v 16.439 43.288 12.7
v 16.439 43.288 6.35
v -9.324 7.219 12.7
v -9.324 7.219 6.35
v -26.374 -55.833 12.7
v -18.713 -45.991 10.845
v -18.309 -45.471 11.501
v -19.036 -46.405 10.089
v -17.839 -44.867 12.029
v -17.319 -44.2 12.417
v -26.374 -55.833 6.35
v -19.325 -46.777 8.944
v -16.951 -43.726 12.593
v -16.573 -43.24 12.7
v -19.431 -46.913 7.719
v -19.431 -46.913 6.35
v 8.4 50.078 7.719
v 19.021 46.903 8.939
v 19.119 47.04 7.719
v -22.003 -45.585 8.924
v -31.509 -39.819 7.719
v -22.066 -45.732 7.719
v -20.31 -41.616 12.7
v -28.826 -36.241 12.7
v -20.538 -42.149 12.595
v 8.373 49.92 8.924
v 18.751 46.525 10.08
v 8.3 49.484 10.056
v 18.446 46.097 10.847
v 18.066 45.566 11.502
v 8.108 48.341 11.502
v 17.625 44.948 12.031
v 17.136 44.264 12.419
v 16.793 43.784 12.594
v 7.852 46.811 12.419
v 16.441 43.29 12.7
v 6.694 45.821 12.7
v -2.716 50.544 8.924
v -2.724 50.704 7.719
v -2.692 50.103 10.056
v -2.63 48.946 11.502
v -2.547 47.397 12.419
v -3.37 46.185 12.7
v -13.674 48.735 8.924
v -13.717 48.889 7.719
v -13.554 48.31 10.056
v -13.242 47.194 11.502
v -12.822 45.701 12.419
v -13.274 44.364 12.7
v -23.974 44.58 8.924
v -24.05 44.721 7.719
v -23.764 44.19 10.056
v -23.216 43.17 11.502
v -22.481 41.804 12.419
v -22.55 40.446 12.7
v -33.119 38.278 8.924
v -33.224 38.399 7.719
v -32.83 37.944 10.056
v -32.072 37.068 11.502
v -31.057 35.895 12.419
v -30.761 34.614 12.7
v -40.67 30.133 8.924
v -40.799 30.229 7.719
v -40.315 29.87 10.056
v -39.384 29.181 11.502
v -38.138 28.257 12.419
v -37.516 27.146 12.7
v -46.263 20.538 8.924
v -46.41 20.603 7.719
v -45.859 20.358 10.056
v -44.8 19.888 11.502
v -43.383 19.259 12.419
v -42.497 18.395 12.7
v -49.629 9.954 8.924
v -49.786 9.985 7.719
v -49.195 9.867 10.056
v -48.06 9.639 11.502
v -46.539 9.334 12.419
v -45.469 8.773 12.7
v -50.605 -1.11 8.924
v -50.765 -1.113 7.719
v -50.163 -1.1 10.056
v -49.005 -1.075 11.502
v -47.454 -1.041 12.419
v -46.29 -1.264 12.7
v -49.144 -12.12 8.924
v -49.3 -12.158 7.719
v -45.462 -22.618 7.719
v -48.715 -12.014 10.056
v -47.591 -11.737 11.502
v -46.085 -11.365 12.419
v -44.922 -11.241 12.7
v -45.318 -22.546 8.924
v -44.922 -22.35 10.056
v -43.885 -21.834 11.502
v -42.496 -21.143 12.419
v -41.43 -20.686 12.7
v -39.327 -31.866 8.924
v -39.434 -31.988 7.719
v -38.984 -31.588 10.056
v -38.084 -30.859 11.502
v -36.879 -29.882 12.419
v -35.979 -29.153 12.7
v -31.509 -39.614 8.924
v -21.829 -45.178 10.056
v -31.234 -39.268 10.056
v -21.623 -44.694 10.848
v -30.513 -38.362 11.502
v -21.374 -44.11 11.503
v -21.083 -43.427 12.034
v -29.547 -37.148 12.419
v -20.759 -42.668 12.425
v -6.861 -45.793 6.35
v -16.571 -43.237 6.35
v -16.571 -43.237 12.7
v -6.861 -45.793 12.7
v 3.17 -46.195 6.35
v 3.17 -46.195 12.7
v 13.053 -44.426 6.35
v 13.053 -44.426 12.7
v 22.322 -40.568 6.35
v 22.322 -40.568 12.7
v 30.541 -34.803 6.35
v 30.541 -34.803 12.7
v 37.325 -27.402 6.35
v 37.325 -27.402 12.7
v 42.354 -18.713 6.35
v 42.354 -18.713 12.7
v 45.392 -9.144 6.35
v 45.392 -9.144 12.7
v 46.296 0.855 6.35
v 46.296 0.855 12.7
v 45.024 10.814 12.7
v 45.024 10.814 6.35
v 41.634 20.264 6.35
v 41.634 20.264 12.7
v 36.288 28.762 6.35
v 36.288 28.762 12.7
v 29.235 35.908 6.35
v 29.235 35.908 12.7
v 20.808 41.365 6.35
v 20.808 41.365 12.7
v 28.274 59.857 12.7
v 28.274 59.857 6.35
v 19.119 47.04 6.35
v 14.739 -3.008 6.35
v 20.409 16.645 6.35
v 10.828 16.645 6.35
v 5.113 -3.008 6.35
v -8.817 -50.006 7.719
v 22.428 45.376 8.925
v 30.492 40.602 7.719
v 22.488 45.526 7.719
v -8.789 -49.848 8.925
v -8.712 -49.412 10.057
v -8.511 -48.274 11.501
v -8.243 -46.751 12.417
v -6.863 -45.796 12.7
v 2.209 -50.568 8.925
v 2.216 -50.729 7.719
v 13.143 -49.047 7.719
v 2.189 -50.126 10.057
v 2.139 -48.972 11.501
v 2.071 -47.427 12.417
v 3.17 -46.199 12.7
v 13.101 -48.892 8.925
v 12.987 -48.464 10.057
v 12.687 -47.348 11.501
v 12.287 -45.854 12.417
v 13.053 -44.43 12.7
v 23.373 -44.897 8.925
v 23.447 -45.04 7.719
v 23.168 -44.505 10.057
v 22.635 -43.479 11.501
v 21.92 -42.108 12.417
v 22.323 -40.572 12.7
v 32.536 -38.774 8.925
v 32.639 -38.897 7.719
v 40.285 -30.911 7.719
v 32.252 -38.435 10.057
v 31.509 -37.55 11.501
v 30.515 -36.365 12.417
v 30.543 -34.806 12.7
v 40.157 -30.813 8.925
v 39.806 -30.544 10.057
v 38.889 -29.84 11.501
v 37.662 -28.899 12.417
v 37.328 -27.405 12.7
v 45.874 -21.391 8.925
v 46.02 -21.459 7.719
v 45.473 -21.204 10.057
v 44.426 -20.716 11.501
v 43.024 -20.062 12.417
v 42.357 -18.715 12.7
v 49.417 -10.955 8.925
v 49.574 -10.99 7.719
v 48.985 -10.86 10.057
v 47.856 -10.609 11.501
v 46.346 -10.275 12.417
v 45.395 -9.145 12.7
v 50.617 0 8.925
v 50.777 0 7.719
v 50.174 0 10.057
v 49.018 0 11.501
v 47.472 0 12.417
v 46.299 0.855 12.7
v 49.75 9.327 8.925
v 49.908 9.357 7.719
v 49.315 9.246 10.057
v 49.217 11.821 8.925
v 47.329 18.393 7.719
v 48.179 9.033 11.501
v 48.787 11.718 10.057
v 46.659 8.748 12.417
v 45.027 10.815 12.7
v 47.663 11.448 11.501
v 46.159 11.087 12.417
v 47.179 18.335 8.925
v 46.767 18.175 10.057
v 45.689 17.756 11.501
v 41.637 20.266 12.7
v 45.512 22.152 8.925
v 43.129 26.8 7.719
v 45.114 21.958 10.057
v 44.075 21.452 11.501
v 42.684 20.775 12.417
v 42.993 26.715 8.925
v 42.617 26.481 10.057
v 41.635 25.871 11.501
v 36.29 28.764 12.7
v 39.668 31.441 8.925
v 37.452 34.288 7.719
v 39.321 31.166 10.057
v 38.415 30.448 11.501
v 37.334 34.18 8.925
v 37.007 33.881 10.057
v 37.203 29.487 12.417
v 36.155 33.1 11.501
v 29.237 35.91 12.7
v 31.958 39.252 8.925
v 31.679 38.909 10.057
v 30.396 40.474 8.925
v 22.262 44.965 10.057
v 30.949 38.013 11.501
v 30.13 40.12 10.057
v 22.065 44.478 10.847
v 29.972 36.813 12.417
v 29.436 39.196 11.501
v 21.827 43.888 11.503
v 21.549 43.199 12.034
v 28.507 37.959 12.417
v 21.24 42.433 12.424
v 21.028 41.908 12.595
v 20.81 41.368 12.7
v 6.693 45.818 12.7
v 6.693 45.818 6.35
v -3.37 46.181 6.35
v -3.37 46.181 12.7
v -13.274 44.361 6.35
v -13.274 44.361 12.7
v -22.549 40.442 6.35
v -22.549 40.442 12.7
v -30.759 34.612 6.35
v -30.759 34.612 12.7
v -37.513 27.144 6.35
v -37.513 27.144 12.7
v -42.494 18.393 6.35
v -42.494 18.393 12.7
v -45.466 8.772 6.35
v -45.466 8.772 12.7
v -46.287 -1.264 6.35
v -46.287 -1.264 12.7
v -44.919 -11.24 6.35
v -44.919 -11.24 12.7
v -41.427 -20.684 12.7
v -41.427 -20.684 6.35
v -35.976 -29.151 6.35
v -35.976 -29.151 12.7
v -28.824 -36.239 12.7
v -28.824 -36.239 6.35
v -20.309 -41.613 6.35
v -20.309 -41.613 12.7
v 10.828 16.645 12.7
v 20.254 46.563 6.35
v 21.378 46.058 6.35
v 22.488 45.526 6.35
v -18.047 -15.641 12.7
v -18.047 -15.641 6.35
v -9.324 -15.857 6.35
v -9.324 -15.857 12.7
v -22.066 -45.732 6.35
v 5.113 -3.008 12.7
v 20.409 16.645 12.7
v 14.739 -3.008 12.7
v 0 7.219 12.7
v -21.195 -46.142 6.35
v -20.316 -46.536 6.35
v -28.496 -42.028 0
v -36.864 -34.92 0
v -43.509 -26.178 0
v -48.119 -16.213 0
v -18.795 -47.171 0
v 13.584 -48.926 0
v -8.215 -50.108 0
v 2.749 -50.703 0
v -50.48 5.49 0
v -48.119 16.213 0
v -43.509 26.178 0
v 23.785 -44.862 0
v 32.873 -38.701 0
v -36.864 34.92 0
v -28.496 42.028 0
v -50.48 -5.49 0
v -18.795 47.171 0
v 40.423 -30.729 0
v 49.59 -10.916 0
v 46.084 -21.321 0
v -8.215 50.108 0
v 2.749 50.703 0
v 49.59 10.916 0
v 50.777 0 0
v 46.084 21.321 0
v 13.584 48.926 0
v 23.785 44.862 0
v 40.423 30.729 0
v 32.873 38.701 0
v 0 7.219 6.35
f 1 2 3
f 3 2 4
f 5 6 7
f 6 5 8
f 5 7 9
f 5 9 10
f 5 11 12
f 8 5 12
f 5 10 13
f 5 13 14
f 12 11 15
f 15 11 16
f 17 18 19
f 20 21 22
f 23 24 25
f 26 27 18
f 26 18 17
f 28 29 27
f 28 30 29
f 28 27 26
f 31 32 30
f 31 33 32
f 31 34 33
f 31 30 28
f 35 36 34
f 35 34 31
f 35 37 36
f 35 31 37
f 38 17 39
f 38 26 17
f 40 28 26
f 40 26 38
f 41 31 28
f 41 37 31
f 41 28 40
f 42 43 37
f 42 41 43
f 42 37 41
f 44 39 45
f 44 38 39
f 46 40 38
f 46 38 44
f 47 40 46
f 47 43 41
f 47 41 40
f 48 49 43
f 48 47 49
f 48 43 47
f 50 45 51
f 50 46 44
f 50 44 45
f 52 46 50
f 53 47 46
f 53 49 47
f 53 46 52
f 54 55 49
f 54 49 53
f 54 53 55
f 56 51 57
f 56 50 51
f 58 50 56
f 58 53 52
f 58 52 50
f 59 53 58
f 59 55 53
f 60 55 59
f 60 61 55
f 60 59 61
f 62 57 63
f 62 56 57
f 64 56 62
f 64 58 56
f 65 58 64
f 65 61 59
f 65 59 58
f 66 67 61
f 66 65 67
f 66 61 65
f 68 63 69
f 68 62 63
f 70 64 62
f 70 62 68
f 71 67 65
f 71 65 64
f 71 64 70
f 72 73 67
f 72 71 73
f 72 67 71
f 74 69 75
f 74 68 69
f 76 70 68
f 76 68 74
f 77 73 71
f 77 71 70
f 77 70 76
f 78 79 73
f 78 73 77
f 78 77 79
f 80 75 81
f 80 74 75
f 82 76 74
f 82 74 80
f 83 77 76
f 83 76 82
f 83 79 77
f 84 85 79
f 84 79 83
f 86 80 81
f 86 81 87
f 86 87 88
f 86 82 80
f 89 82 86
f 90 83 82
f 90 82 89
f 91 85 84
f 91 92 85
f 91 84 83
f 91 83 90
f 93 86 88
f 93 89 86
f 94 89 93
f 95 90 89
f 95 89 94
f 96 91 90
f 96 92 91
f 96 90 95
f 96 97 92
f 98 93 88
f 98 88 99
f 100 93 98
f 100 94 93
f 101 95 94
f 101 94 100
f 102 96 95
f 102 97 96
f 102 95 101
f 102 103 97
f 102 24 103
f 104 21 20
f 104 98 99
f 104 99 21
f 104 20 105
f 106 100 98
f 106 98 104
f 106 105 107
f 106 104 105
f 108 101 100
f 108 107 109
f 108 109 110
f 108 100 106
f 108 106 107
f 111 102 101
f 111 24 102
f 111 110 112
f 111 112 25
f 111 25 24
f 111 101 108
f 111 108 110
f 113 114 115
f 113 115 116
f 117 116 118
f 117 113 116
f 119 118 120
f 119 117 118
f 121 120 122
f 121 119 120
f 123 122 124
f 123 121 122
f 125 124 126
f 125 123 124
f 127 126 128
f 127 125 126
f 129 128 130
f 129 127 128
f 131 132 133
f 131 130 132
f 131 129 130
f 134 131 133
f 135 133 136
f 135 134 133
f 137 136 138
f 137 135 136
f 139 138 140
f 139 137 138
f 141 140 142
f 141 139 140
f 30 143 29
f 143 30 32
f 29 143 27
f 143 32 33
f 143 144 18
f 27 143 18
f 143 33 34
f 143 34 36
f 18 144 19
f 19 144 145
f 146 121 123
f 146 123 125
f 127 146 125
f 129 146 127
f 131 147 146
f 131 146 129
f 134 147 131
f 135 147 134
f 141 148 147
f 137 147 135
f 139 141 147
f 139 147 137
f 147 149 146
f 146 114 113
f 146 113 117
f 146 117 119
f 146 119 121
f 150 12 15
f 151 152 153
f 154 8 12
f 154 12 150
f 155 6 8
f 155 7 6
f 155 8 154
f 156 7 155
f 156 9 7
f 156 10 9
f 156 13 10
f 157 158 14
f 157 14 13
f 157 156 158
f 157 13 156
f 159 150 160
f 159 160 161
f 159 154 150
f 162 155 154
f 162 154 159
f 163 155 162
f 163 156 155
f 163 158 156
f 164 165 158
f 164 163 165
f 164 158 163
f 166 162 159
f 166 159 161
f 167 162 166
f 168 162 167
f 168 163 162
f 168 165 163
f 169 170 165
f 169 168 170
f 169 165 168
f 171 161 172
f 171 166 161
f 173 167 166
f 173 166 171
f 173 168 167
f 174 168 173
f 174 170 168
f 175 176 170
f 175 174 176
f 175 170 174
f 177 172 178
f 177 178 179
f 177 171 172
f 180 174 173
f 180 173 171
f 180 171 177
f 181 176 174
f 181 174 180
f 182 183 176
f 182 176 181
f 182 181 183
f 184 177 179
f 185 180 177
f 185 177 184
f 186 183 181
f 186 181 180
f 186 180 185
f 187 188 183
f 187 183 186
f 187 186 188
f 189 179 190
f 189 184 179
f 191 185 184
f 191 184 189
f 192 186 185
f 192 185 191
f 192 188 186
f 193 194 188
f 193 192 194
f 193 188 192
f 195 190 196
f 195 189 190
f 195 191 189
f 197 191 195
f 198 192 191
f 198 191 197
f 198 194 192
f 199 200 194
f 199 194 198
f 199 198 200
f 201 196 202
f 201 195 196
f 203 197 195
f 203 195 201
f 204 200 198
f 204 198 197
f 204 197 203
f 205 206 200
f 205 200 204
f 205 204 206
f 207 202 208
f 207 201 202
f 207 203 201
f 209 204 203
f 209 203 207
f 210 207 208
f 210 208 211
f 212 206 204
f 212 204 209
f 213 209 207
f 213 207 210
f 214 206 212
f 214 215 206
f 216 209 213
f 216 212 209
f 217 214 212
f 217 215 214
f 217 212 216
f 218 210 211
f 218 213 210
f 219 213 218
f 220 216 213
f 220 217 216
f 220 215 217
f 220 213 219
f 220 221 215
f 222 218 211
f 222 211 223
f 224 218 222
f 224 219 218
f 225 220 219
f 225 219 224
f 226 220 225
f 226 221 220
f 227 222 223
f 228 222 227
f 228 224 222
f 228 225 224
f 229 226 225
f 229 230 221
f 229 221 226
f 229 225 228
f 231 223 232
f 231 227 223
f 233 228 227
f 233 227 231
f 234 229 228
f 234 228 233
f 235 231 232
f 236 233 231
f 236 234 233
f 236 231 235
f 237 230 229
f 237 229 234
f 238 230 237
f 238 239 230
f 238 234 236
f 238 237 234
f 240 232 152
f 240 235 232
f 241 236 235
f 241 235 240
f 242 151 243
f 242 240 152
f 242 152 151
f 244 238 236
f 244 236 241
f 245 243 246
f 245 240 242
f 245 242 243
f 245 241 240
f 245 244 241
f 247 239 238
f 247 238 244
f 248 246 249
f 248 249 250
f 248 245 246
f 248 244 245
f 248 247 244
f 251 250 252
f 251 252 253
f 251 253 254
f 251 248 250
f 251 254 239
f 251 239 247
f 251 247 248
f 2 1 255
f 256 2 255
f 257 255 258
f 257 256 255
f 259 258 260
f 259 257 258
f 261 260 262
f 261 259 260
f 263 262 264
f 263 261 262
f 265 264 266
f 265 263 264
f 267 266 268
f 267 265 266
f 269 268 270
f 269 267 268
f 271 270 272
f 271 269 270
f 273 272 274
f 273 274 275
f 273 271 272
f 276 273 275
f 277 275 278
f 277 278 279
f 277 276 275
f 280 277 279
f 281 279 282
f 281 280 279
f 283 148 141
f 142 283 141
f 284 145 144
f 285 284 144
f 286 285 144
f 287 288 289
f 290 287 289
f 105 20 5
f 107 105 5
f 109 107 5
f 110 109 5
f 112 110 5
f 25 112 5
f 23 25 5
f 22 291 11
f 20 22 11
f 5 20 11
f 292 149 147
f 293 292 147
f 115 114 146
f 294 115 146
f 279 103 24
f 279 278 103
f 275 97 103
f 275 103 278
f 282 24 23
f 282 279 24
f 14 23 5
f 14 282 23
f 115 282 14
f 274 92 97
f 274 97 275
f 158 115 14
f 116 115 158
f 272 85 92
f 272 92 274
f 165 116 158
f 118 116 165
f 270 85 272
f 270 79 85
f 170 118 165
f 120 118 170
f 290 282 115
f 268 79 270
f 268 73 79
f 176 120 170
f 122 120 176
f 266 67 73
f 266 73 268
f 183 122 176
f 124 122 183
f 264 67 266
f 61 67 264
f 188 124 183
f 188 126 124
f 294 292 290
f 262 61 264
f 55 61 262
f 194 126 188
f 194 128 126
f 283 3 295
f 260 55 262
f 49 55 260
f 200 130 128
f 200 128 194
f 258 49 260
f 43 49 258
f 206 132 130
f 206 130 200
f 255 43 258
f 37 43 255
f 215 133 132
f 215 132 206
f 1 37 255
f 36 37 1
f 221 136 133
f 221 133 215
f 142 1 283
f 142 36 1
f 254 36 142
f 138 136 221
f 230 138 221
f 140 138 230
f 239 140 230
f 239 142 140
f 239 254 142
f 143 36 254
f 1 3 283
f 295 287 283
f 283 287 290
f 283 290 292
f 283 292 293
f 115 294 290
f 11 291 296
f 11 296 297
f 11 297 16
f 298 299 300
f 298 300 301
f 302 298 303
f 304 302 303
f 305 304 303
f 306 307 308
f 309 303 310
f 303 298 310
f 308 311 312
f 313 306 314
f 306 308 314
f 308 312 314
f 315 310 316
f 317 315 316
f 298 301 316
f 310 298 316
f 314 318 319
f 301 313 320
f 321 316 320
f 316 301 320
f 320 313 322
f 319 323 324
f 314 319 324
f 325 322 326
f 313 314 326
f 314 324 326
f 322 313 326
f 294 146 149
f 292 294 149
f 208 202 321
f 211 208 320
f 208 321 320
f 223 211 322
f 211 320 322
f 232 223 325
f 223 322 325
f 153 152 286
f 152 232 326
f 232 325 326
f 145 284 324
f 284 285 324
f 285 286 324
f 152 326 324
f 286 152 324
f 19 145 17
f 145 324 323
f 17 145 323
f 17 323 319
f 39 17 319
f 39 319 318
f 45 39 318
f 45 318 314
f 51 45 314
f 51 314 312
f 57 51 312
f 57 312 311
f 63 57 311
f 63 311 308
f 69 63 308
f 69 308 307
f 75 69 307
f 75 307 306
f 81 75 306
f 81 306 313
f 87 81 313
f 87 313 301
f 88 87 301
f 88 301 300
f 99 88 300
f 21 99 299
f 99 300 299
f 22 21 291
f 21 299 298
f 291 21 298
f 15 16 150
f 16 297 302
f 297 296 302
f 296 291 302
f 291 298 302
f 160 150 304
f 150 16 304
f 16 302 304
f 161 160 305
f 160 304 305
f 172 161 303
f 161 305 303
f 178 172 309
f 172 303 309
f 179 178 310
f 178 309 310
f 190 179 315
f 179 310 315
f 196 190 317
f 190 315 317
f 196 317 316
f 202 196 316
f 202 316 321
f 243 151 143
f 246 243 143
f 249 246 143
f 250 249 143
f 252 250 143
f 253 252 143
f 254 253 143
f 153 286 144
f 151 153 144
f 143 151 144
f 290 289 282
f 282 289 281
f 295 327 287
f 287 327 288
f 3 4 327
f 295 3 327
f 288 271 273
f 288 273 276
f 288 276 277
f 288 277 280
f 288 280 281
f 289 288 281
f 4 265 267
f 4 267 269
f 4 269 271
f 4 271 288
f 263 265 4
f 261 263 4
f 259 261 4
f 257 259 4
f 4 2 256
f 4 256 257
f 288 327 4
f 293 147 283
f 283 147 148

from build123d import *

# Parameters (mm, degrees)
F0_R     = 46.303997109
F1_DEPTH = 6.35
F0_R_2   = 50.7773250867
F2_DEPTH = 12.7
F5_DEPTH = 6.35


# Not quite as in the source:
# - a fillet or chamfer that OpenCascade refuses, or shapes differently, is made with other operations: its cross-section is extruded or revolved along the edge and cut away or added


with BuildPart() as f1:
    # F0 (on Top) → F1 (new body)
    with BuildSketch(Plane.XY):
        Circle(F0_R)
    extrude(amount=F1_DEPTH)

    # F0 (on Top) → F2 (join)
    with BuildSketch(Plane.XY):
        Circle(F0_R_2)
        Circle(F0_R, mode=Mode.SUBTRACT)
    extrude(amount=F2_DEPTH)

    # F3: fillet of radius 5.08 on 1 edges, made by hand

    # F3_s1 → F3_t2 (revolve, cut)
    with BuildSketch(Plane.XZ):
        with BuildLine():
            ThreePointArc((50.7777250867, 7.6554991612), (49.4982109042, 11.0268790536), (46.3040449454, 12.7003971293))
            Line((46.3040449454, 12.7003971293), (46.3648134998, 13.2048869261))
            ThreePointArc((46.3648134998, 13.2048869261), (48.540685016, 13.2081365685), (50.7773250867, 13.2081365685))
            Line((50.7773250867, 13.2081365685), (51.2854616553, 12.7))
            ThreePointArc((51.2854616553, 12.7), (51.2854616553, 10.1777495806), (51.2858616553, 7.6554991612))
            Line((51.2858616553, 7.6554991612), (50.7777250867, 7.6554991612))
        make_face()
    revolve(axis=Axis((0, 0, 12.7), (0, 0, 1)), mode=Mode.SUBTRACT)

    # F4 (on face) → F5 (join)
    with BuildSketch(Plane.XY.offset(6.35)):
        Polygon((-9.3244733289, -15.8572378275), (-26.3735784938, -55.8334334653), (14.7386826575, -3.0078946147), (5.1134219393, -3.0078946147), (20.4086864271, 16.6451374931), (10.8284205198, 16.6451374931), (28.2742083073, 59.8571076989), (-9.3244733289, 7.2189471684), (0, 7.2189471684), (-18.0473700166, -15.6410522759), align=None)
    extrude(amount=F5_DEPTH)


solid = f1.part
